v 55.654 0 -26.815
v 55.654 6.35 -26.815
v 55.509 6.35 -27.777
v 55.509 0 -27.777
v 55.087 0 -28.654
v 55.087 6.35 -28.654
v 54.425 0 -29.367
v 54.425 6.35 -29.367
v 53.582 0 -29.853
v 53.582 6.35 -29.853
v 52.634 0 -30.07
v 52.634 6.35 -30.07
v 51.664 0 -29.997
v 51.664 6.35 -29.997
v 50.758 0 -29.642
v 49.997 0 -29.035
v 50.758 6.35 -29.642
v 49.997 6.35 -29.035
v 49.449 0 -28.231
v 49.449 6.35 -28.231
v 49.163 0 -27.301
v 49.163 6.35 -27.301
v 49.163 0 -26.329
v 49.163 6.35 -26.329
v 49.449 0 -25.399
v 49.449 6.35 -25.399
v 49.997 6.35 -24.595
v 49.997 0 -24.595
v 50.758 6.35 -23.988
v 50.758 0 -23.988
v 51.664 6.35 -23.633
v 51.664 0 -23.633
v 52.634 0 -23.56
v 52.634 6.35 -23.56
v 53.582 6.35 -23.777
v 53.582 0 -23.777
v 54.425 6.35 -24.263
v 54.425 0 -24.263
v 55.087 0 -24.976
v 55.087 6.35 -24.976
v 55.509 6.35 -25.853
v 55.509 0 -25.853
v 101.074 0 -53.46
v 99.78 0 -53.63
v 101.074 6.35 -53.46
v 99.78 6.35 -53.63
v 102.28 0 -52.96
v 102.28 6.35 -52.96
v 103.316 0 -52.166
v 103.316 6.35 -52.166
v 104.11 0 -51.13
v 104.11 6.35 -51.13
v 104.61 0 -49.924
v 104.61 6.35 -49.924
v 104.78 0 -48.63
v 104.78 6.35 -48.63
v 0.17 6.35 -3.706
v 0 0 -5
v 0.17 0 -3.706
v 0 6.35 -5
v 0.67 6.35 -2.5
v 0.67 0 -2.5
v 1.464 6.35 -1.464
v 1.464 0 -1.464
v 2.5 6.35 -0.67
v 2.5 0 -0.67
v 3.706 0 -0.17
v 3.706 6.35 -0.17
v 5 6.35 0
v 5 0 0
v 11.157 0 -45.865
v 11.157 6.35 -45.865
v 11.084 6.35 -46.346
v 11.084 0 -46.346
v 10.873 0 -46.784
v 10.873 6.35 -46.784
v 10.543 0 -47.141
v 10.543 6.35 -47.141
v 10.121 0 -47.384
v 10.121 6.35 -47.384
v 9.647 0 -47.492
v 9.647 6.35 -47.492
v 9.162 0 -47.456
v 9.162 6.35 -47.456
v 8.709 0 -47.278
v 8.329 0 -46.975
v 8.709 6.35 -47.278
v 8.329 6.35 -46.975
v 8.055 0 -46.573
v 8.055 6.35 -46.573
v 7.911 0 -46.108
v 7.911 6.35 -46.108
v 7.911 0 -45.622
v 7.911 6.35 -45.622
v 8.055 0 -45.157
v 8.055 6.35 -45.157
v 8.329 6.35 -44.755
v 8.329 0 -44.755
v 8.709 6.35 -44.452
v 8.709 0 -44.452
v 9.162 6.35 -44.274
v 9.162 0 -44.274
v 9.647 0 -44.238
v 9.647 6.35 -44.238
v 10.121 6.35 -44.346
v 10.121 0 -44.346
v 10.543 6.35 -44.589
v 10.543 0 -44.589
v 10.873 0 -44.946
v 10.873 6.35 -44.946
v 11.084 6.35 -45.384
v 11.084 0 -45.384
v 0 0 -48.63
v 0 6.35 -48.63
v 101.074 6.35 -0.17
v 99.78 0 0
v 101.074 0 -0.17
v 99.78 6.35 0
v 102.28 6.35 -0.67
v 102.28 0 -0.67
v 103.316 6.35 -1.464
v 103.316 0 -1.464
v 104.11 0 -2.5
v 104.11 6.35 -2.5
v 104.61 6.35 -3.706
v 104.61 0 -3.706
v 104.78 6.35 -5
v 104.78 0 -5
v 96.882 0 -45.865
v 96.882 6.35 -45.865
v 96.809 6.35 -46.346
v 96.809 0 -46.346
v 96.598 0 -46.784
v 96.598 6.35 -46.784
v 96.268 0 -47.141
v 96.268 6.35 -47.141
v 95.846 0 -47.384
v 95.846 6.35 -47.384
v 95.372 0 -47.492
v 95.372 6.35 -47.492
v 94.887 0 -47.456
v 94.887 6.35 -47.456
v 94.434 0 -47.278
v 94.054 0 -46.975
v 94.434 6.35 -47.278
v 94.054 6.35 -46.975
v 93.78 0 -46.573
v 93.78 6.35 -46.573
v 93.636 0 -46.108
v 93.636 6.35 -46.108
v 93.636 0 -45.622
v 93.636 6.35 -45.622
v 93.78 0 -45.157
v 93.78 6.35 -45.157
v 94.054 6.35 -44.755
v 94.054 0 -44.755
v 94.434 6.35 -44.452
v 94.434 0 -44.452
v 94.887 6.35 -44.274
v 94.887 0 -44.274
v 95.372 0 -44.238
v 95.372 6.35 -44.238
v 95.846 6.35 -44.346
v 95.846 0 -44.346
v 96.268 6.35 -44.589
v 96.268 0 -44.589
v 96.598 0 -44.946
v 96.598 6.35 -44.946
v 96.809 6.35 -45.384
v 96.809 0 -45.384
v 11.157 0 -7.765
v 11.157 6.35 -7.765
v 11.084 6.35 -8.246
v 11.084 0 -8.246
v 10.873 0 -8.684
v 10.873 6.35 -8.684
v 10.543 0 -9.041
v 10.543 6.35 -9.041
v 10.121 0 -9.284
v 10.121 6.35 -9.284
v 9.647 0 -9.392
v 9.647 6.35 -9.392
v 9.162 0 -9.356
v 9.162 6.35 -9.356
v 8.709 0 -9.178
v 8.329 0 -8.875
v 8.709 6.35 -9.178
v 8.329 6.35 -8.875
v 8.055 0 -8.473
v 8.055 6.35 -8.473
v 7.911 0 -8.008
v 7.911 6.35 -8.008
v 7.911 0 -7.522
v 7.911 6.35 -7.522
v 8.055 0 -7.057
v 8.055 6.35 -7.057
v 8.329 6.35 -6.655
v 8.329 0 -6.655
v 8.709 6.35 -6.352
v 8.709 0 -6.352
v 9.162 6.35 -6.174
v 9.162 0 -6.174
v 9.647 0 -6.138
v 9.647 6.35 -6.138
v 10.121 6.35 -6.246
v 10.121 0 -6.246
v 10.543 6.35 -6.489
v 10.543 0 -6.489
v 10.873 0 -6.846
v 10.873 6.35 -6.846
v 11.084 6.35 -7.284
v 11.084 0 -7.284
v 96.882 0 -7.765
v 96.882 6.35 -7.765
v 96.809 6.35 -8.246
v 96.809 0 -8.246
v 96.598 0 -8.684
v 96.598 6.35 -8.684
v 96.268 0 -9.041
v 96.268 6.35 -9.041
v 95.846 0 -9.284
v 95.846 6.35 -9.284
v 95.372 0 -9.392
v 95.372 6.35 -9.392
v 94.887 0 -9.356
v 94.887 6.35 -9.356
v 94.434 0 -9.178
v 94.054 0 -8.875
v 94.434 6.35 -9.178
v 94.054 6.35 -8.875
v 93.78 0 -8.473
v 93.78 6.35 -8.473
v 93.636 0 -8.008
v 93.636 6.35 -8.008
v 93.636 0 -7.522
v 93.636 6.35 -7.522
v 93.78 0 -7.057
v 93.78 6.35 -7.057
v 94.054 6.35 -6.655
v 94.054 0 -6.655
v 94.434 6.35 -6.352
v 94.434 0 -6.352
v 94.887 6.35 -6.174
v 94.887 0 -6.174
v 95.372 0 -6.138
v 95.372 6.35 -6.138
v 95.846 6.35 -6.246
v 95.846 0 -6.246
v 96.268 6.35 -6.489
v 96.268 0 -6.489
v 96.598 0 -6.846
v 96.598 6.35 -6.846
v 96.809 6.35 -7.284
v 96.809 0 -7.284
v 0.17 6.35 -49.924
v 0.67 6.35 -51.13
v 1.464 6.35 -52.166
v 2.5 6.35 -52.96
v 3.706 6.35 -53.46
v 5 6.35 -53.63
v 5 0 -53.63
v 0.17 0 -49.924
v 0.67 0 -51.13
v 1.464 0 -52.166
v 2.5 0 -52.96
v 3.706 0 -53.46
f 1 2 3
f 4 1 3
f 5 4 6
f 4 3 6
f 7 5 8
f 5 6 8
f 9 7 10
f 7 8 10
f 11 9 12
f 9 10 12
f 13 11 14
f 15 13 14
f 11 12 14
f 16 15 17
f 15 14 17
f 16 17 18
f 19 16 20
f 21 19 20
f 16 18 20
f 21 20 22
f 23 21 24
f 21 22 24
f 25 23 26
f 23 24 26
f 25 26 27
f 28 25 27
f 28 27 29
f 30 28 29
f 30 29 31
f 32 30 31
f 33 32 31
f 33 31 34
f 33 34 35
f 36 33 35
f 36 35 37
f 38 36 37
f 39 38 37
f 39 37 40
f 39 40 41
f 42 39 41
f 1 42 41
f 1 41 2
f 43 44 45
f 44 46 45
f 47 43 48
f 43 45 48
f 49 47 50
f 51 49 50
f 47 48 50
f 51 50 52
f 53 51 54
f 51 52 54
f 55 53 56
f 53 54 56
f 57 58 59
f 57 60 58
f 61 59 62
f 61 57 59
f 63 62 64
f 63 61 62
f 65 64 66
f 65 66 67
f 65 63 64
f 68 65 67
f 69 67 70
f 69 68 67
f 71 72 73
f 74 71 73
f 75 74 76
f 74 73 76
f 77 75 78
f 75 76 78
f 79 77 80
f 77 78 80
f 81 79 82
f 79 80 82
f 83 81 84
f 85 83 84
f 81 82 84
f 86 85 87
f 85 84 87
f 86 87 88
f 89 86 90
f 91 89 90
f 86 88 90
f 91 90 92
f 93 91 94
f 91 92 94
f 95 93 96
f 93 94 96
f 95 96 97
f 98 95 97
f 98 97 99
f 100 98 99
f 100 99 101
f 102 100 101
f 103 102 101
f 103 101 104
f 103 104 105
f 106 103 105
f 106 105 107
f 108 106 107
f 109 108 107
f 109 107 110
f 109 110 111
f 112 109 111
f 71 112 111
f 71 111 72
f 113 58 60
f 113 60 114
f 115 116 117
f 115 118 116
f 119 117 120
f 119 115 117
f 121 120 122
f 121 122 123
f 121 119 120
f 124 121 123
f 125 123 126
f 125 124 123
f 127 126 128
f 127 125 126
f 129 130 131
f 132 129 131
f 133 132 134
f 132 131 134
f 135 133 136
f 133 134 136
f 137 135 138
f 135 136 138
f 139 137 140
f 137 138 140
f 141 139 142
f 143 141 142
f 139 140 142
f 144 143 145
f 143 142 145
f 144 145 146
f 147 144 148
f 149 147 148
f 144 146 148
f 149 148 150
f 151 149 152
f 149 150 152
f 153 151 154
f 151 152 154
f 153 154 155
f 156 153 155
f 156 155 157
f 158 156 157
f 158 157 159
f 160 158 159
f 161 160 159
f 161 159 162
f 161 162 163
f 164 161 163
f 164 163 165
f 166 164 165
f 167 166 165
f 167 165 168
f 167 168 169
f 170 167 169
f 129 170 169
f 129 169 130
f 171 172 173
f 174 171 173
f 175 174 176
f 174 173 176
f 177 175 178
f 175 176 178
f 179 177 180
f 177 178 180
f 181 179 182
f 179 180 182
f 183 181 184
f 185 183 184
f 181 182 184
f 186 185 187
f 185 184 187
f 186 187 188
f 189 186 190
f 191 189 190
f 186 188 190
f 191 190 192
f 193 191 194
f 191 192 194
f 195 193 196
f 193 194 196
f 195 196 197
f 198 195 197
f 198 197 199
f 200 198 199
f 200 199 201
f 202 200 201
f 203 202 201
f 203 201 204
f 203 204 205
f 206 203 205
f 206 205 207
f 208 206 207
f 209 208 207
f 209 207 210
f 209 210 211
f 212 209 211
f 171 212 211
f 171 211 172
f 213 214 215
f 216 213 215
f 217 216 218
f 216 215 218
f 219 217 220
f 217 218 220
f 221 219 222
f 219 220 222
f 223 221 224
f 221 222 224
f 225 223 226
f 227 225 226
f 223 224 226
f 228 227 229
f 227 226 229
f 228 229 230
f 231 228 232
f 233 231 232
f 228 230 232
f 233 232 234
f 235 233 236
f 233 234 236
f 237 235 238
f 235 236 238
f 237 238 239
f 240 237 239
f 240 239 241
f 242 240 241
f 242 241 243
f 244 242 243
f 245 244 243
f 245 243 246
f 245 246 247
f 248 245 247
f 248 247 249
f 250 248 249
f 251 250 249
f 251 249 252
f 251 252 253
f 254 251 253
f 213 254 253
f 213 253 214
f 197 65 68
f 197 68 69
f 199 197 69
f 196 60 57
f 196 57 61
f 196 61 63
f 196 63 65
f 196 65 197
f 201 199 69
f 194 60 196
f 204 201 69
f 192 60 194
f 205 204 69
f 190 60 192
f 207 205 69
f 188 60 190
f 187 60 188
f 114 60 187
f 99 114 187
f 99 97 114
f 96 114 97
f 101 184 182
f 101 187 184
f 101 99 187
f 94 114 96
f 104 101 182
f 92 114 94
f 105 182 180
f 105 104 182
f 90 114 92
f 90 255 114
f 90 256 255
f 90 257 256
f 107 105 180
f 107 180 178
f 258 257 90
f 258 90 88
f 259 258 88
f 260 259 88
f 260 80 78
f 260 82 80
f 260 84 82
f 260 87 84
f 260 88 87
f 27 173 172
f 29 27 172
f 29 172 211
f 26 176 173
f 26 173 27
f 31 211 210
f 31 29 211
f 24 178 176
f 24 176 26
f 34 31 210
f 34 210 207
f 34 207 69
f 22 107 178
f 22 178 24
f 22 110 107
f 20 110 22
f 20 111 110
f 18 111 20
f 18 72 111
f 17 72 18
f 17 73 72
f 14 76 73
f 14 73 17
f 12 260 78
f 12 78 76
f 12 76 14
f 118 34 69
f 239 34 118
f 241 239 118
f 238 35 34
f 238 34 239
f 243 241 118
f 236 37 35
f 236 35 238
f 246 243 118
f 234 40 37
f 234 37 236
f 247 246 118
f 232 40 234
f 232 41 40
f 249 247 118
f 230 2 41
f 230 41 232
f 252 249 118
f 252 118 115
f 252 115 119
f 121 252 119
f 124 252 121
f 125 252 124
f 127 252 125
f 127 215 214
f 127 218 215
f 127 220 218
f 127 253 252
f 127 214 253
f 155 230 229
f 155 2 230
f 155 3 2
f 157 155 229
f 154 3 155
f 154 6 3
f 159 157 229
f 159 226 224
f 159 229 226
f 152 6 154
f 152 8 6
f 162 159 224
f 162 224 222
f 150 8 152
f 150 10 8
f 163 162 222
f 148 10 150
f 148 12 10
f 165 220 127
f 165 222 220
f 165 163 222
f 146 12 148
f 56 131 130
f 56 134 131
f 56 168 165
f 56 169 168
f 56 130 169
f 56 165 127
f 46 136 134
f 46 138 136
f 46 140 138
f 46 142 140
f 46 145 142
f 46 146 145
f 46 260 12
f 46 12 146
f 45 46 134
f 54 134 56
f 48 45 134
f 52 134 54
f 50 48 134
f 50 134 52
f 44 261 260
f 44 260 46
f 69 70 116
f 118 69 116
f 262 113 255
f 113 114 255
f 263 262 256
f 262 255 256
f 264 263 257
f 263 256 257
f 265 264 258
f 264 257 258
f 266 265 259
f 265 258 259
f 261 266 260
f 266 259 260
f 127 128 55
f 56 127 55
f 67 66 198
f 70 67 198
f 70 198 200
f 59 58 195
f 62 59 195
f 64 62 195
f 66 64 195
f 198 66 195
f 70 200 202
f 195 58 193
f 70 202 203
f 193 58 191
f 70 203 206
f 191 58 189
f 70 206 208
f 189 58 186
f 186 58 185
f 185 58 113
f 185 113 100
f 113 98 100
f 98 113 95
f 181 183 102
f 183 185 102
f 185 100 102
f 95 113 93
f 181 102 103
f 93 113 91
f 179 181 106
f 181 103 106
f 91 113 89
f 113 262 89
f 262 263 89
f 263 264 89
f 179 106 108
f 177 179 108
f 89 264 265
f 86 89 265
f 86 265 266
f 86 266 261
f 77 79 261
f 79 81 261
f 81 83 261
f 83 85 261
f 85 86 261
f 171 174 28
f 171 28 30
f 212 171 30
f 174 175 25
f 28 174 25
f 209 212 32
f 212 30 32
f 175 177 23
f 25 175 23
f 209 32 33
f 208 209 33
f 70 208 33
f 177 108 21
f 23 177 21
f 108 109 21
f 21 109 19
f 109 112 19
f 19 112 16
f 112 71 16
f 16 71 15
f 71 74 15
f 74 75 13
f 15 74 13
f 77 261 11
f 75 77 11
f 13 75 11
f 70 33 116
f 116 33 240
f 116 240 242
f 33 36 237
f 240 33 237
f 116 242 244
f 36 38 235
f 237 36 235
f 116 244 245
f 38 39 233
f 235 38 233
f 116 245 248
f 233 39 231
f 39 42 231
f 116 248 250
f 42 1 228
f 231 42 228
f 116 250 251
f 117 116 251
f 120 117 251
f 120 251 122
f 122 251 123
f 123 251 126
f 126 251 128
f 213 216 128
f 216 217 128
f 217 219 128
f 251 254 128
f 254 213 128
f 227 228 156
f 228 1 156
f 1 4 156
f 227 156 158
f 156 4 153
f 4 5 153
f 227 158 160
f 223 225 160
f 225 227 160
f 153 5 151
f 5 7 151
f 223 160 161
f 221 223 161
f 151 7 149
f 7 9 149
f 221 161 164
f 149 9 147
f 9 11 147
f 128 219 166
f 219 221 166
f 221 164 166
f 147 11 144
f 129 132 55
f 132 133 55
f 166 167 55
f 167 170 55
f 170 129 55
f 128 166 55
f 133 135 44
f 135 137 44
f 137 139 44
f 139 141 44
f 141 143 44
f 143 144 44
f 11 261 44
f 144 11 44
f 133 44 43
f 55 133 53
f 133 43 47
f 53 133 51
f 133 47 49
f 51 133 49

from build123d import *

# Parameters (mm, degrees)
SKETCH1_W                    = 104.78
SKETCH1_H                    = 53.63
BOSS_EXTRUDE1_DEPTH          = 6.35
F_0_257_DIAMETER_HOLE1_D     = 6.5278
F_30_0_1285_DIAMETER_HOLE1_D = 3.2639
FILLET1_R                    = 5


with BuildPart() as part:
    # Sketch1 → Boss-Extrude1 (new body)
    with BuildSketch(Plane(origin=(0, 0, 0), x_dir=(1, 0, 0), z_dir=(0, 1, 0))):
        with Locations((52.39, 26.815)):
            Rectangle(SKETCH1_W, SKETCH1_H)
    extrude(amount=BOSS_EXTRUDE1_DEPTH)

    # F (0.257) Diameter Hole1 (through all)
    with Locations(Plane(origin=(0, 0, 0), x_dir=(-1, 0, 0), z_dir=(0, -1, 0))):
        with Locations((-52.39, 26.815)):
            Hole(F_0_257_DIAMETER_HOLE1_D / 2)

    # #30 (0.1285) Diameter Hole1 (through all)
    with Locations(Plane(origin=(0, 0, 0), x_dir=(-1, 0, 0), z_dir=(0, -1, 0))):
        with Locations((-9.525, 7.765), (-9.525, 45.865), (-95.25, 45.865), (-95.25, 7.765)):
            Hole(F_30_0_1285_DIAMETER_HOLE1_D / 2)

    # Fillet1
    fillet1_edges = [part.edges().sort_by_distance(p)[0] for p in [
        (0, 3.175, -53.63),
        (104.78, 3.175, -53.63),
        (104.78, 3.175, 0),
        (0, 3.175, 0),
    ]]
    fillet(fillet1_edges, radius=FILLET1_R)


solid = part.part
